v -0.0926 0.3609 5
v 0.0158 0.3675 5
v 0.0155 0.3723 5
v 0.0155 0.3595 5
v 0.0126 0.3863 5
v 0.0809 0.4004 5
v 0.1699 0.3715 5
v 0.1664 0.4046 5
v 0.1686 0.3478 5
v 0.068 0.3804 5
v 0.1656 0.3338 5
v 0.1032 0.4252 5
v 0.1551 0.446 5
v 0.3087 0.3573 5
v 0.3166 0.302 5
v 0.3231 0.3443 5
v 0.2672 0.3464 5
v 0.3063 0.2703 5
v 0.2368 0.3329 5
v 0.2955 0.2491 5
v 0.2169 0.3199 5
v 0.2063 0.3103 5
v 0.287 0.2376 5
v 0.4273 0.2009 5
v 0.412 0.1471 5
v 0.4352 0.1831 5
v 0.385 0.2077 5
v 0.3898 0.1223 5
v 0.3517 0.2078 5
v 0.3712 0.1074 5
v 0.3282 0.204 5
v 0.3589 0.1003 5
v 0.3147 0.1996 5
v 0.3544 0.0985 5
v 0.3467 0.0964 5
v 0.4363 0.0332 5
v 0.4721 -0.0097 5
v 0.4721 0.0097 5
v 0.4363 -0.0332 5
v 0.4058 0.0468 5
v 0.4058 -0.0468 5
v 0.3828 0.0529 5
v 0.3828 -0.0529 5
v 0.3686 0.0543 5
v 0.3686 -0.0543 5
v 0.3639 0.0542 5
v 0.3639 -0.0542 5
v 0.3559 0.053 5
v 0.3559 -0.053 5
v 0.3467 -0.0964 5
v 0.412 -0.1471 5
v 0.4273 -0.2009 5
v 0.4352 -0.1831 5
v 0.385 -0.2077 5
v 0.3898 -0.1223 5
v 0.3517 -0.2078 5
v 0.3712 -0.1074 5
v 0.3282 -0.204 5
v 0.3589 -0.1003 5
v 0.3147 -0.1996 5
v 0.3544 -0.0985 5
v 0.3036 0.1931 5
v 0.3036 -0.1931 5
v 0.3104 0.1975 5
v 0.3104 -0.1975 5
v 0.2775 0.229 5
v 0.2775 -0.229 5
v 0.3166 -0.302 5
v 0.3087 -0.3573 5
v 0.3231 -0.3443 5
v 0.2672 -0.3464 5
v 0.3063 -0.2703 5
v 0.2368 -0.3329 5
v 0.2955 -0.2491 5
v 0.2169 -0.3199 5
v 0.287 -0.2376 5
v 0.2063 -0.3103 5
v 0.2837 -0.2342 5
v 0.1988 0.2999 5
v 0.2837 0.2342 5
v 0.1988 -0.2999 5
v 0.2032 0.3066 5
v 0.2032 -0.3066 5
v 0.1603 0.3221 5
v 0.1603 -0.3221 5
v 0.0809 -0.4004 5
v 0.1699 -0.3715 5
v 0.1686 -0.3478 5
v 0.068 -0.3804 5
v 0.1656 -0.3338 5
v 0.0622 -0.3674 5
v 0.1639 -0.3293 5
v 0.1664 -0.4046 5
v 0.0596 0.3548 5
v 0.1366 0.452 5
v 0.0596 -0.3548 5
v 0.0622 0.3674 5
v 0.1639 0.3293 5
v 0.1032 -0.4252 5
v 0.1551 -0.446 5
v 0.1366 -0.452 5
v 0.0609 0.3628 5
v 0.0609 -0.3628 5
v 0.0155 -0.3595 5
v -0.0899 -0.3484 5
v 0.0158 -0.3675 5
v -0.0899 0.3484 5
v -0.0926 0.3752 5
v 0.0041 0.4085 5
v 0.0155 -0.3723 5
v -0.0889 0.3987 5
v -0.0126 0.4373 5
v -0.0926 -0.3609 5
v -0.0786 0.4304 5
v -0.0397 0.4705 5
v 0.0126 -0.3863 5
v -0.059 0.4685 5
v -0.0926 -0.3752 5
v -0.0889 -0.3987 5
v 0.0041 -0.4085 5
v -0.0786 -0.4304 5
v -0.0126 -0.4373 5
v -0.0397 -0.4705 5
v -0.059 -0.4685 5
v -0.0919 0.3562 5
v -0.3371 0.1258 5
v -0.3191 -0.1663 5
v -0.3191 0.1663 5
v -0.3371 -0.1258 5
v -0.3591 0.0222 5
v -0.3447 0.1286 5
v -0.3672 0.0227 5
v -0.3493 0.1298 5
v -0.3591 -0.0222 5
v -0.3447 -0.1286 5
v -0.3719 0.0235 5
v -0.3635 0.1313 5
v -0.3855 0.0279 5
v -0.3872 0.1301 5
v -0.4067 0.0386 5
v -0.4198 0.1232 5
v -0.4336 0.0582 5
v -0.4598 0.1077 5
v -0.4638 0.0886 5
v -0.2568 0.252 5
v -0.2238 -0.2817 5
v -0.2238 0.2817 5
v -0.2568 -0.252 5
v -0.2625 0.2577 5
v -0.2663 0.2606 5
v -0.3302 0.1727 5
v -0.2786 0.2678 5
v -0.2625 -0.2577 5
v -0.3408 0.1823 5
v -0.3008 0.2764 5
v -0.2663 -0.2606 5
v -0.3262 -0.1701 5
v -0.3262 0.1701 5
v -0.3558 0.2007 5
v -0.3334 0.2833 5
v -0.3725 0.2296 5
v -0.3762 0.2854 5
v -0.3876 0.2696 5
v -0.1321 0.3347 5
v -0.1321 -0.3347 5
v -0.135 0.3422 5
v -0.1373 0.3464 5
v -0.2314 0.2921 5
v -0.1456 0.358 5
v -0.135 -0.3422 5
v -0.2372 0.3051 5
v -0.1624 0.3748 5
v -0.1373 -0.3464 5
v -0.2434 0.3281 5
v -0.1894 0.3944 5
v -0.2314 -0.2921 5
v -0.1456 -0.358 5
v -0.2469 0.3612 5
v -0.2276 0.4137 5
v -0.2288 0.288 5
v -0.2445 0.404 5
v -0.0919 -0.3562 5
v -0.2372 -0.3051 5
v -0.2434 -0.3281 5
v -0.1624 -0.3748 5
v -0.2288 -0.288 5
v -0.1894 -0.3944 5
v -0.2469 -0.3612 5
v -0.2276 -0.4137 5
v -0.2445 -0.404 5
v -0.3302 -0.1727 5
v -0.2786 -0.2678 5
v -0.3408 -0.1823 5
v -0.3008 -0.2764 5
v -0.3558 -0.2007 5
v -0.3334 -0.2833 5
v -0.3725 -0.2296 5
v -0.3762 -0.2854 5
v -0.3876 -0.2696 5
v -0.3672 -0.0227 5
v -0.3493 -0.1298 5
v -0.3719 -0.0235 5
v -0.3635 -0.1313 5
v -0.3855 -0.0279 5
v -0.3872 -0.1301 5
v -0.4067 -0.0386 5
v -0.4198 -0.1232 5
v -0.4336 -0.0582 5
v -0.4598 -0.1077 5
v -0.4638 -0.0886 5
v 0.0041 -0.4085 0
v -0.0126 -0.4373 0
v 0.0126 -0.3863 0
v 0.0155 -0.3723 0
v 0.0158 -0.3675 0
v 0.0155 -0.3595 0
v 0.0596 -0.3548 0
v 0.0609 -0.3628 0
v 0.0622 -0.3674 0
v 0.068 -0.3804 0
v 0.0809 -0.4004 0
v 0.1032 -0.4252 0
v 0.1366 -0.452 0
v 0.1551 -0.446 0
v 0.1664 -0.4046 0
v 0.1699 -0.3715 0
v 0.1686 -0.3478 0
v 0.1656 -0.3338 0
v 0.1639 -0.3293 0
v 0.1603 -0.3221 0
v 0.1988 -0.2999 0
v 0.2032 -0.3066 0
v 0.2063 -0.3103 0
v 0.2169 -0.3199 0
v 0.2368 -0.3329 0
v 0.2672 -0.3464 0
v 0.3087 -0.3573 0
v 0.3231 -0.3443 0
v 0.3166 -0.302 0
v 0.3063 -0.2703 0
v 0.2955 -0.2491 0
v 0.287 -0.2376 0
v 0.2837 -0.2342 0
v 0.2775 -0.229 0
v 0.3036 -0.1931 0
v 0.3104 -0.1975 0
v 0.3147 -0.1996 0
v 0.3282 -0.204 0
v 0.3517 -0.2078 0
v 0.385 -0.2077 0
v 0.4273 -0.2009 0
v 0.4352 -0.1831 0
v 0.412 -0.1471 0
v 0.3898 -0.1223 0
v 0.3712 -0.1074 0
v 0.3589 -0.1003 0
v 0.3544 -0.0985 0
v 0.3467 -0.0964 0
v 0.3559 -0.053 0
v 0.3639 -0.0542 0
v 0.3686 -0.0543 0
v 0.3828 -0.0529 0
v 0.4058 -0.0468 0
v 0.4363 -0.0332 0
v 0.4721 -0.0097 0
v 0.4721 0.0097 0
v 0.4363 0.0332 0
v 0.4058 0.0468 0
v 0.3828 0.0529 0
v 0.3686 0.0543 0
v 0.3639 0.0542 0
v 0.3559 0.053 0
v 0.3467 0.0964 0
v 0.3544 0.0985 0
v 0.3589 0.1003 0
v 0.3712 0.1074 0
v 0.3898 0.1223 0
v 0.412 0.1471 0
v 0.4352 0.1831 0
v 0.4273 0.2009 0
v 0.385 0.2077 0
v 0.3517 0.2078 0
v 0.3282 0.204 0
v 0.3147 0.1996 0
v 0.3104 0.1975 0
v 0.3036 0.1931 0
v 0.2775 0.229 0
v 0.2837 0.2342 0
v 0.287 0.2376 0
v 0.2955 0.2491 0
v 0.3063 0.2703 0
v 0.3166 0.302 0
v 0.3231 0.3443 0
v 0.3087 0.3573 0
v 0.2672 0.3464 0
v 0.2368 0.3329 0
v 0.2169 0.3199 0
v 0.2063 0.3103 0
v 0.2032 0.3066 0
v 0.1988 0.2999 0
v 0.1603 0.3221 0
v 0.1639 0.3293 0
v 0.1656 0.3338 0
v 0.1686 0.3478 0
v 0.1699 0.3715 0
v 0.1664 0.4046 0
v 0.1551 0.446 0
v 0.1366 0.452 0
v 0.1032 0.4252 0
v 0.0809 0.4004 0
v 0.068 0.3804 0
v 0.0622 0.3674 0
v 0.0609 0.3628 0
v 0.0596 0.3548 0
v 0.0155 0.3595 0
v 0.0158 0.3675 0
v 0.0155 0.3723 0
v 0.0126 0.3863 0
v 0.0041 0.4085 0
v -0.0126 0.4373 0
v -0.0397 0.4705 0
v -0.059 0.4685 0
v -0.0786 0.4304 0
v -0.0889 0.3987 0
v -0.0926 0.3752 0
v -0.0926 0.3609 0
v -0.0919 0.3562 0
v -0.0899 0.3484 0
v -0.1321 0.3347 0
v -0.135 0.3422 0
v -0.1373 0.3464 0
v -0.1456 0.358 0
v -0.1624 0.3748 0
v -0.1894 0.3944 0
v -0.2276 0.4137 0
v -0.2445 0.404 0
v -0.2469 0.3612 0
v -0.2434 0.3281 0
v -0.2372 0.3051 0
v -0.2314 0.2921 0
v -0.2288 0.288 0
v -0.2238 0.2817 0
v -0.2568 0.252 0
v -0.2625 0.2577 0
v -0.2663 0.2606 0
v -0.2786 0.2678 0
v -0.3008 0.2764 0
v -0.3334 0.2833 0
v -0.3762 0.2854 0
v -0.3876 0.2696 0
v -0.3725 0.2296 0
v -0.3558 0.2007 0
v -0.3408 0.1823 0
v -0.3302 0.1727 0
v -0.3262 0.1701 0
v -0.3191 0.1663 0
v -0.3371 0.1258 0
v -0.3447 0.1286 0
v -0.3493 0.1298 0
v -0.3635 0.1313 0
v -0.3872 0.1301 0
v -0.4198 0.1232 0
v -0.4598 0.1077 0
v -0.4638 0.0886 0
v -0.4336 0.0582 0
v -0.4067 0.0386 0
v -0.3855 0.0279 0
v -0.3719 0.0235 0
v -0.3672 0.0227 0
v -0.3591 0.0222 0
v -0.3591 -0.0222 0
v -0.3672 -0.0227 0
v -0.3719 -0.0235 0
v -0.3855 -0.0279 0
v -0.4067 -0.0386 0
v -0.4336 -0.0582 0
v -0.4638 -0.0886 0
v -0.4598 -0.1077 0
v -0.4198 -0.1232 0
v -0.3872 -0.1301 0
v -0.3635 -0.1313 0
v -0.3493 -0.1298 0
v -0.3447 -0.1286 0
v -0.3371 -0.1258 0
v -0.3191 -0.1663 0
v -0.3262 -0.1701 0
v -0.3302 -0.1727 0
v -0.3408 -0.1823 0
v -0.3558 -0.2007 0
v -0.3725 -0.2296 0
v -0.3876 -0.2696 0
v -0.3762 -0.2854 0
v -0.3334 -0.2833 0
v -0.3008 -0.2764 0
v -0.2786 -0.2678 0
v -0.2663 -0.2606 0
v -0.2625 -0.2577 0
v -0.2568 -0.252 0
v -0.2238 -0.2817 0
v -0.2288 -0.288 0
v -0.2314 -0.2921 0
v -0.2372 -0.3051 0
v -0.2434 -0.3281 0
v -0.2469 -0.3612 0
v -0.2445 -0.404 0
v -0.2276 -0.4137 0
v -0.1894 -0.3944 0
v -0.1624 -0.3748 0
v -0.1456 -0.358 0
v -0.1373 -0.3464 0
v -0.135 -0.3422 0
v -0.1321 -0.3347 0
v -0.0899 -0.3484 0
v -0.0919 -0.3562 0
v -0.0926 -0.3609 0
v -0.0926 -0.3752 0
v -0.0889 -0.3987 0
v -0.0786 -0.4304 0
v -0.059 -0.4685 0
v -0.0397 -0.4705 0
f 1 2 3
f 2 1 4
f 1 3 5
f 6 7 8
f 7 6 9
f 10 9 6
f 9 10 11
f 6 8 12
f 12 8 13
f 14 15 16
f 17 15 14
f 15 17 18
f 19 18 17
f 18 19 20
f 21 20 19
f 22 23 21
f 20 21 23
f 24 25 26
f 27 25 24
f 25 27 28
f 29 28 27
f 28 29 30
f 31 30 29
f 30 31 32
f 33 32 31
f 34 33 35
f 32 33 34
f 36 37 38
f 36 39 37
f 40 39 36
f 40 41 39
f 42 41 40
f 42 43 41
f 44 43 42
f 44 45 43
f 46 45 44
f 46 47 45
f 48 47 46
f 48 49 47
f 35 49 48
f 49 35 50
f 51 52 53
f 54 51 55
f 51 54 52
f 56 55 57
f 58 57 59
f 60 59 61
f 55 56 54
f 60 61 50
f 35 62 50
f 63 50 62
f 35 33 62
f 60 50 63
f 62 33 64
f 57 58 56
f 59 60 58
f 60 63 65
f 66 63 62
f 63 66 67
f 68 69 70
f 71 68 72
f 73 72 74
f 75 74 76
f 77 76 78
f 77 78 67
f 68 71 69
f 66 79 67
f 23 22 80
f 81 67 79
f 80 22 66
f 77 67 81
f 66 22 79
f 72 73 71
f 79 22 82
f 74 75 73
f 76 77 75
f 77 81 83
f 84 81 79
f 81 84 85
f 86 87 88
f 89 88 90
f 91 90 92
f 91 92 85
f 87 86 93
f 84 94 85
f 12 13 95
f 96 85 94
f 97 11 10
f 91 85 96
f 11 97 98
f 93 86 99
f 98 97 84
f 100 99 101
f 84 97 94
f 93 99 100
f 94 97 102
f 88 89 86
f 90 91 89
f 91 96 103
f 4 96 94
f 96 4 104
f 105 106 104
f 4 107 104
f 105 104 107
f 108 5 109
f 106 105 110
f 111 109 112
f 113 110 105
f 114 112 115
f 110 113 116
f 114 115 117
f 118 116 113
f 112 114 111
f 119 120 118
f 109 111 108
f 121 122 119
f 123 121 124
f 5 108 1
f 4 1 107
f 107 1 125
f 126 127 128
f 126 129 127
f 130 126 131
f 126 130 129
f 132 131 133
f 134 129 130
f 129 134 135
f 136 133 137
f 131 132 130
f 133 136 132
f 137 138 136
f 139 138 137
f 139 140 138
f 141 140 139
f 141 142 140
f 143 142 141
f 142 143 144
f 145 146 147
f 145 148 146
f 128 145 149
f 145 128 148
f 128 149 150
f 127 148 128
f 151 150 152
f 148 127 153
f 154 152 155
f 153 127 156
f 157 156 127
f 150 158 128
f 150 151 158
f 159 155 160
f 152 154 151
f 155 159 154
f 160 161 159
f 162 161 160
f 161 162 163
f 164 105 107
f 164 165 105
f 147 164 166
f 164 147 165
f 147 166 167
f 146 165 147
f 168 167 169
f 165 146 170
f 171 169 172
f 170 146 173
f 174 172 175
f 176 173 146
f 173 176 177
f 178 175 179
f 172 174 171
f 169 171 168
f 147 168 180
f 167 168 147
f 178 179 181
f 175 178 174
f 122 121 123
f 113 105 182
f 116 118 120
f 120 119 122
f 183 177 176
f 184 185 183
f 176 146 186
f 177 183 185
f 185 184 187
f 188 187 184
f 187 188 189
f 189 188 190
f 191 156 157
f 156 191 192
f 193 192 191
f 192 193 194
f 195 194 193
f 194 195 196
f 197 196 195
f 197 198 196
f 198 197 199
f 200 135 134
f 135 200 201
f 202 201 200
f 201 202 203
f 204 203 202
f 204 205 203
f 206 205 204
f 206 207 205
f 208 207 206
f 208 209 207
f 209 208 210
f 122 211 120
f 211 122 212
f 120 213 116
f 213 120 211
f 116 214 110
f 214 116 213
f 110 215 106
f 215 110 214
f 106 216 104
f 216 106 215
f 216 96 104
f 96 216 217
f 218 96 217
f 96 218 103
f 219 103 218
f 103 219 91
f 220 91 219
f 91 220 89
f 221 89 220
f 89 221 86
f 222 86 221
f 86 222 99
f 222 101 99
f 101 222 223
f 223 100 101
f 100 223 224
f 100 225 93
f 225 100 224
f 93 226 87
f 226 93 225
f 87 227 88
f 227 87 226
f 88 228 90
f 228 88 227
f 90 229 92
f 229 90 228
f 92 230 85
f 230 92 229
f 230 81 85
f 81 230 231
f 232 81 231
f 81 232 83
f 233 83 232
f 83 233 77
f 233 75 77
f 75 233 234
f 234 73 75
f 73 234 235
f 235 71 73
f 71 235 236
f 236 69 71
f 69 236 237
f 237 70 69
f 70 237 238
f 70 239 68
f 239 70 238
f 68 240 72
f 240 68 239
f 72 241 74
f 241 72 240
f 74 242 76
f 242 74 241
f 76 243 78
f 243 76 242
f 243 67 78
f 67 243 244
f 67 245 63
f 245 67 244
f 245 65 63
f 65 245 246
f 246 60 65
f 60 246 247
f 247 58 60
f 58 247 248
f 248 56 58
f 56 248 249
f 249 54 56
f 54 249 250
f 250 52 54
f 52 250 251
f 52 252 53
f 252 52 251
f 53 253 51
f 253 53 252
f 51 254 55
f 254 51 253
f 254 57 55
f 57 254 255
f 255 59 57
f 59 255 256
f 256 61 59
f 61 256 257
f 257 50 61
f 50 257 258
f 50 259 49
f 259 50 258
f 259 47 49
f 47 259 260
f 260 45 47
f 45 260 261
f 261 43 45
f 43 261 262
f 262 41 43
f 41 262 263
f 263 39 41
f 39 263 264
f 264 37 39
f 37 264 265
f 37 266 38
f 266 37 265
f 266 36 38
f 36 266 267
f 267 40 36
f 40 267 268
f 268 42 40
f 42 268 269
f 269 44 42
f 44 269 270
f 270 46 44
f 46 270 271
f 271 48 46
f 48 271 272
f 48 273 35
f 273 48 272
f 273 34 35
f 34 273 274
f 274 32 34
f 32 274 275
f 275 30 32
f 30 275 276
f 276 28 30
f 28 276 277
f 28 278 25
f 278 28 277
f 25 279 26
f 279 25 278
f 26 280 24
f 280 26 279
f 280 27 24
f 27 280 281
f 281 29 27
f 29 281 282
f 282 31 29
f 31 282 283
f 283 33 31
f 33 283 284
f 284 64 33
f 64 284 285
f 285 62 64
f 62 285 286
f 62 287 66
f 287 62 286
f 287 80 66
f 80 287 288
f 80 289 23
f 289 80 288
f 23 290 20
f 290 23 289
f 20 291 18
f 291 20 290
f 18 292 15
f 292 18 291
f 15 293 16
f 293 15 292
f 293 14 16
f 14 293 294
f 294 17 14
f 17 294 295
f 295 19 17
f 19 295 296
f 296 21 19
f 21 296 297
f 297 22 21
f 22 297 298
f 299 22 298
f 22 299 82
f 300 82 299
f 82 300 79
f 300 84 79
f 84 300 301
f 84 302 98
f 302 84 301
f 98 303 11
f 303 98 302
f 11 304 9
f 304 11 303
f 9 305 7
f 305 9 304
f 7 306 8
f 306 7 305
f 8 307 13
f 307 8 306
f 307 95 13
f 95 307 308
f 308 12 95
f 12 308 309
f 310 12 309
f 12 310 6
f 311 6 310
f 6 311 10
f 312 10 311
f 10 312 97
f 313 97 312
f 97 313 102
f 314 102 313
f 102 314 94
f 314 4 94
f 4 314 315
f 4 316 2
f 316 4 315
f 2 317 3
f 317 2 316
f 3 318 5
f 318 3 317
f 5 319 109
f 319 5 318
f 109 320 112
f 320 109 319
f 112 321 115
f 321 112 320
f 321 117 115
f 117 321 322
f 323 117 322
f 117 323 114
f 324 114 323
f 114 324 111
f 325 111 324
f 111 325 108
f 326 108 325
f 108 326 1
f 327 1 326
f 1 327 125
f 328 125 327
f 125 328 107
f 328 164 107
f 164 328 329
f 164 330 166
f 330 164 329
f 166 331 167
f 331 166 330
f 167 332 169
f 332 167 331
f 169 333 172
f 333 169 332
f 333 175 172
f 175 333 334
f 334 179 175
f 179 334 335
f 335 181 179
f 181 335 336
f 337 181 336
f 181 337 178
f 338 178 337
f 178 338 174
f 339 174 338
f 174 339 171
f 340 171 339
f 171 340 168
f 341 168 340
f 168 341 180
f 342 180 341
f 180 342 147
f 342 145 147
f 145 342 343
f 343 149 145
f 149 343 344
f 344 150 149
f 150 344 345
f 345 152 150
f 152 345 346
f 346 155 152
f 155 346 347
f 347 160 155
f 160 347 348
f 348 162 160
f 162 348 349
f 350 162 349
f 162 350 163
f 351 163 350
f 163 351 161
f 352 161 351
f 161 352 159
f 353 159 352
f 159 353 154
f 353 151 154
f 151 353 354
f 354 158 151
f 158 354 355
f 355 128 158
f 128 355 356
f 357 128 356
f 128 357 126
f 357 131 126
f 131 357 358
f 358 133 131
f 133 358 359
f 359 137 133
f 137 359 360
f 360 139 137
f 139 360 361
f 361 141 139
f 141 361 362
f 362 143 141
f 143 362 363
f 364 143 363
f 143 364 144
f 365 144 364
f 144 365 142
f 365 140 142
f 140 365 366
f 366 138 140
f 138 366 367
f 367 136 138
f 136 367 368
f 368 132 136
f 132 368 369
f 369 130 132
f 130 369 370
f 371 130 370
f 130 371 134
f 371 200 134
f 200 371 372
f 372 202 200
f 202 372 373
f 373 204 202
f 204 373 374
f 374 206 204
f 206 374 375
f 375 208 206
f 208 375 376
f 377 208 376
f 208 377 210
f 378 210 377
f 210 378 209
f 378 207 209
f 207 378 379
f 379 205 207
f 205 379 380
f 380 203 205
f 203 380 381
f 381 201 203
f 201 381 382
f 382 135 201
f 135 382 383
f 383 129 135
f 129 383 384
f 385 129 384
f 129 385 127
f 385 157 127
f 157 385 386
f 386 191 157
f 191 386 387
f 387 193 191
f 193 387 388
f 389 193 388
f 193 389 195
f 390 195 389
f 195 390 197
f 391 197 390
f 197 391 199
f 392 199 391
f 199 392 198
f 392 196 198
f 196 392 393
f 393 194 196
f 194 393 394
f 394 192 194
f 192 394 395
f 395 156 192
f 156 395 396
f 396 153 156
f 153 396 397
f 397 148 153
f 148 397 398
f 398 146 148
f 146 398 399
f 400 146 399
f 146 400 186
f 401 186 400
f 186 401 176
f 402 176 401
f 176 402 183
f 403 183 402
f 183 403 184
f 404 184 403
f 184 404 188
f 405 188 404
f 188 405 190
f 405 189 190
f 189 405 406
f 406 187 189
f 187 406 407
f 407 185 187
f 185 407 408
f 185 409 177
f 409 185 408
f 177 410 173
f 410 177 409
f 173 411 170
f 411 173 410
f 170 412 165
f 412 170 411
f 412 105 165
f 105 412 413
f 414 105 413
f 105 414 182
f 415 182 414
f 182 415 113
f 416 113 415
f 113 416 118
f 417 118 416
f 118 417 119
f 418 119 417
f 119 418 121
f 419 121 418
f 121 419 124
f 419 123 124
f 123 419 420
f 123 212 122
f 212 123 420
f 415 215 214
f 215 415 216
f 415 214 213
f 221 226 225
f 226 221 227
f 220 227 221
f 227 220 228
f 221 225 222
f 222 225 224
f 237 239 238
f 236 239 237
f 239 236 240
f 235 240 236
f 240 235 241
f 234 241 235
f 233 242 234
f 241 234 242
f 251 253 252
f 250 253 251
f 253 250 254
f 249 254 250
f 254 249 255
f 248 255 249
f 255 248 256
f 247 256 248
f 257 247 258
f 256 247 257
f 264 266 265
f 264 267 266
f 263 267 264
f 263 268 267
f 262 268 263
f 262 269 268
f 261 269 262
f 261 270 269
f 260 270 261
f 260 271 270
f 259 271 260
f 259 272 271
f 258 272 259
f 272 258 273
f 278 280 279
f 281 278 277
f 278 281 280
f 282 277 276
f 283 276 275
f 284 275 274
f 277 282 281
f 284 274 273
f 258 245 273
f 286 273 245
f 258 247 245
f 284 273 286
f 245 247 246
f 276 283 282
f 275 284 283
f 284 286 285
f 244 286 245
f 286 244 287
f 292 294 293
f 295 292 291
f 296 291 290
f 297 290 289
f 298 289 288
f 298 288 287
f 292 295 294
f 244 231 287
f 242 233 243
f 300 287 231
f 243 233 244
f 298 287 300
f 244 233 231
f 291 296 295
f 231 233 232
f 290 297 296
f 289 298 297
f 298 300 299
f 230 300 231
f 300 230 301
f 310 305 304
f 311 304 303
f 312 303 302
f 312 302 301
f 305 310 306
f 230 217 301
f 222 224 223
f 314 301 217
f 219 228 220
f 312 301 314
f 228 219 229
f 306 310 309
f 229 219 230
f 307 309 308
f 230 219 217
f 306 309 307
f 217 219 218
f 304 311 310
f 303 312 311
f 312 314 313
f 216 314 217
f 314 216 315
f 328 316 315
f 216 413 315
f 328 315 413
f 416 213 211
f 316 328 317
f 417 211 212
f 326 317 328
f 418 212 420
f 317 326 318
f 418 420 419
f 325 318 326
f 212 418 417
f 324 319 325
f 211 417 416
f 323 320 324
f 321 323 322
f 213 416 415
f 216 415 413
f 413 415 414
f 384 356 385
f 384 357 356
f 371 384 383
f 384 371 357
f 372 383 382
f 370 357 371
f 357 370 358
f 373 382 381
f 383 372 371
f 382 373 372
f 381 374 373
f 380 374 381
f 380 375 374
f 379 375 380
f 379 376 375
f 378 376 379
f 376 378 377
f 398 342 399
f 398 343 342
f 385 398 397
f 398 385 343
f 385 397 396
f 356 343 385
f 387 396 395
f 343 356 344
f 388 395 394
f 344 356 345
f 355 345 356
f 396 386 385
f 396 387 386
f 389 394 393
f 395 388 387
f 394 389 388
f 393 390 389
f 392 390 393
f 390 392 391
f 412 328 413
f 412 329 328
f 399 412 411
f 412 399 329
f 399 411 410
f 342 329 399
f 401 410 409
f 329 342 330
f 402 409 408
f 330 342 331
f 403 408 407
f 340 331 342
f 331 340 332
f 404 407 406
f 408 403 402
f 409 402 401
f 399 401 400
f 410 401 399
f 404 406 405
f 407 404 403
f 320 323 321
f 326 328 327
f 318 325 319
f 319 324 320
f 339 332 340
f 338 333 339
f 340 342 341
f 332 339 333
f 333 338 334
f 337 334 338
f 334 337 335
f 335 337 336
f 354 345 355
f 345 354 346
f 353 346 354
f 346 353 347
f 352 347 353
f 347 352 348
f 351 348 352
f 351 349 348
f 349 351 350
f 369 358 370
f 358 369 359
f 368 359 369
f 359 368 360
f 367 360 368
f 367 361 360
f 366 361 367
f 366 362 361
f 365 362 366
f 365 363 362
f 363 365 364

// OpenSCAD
// file: machine.scad
/*
 * Helpers for machinging; i.e. kerf alowances
 *
 * Copyright 2013 <b@Zi.iS>
 * License CC BY 3.0
 */

ZCUT = 0;
XOFF = 0;
YOFF = 0;

module drawing() {
	//create blueprint
	if(preview==0) {
		projection(cut=true) translate([
			XOFF,
			YOFF,
			ZCUT
		]) {
            if($children) children([0:$children-1]);
		}
	} else {
        if($children) children([0:$children-1]);
	}
}

module kerf_cube(
	size
) {
	translate([
		kerf/2*(1-preview),
		kerf/2*(1-preview),
		0
	]) {
		cube([
			size[0] - kerf*(1-preview),
			size[1] - kerf*(1-preview),
			size[2]
		]);
	}
}

module kerf_cylinder(
	r,
	h
) {
	cylinder(
		r = r - kerf/2*(1-preview),
		h = h
	);
}

module part(
	id,
	name
) {
	if(PART<1 || PART==id || id<0) {
		if(id>=0) echo(str("PART", id, ":", name));
        if($children) children([0:$children-1]);
	}	
}
// file: easing.scad
/*
 * Make allowances to ensure good fit.
 *
 * Copyright 2013 <b@Zi.iS>
 * License CC BY 3.0
 */

function ease(value) = min(value*1.1, value + .2);
// file: epslion.scad
/*
 * Slightly offset previews to overcome rounding issues
 *
 * Copyright 2013 <b@Zi.iS>
 * License CC BY 3.0
 */

include <config.scad>;

module e(
	shift = -.1,
	size = 1.1
) {
	if(preview == 1) {
		translate([
			0,
			0,
			shift
		]) {
			scale([
				1,
				1,
				size
			]) {
                if($children) children([0:$children-1]);
			}
		}
	} else {
        if($children) children([0:$children-1]);
	}
}

function space(pitch, i) = -pitch/2 + pitch*i;
// file: config.scad
/*
 * Default settings
 *
 * Copyright 2013 <b@Zi.iS>
 * License CC BY 3.0
 */

preview = 1;
$fa = 6;
$fs = 2 - 1.5*(1-preview);
kerf = .3;
PART = 0; //all

// preview colors
color_steel = [.8, .8, .8];
color_wood = [.3, .3, 0];
color_print = [0, .8, 0];
color_plastic = [.7, 1, .7];
color_brass = [181/255, 166/255, 66/255];
color_acrylic = [.9,.9,.9,.5];
// file: main.scad
/*
 * A library to make SCAD easier.
 *
 * Copyright 2013 <b@Zi.iS>
 * License CC BY 3.0
 */

include <config.scad>;
use <epslion.scad>;
use <easing.scad>;
include <machine.scad>;
// main file
/*
 * Herringbone Gear
 *
 * Copyright 2013 b@Zi.iS
 *
 * License CC BY 3.0
 */

include <main.scad>;
use <MCAD/involute_gears.scad>;

herringbone();

module herringbone(
	number_of_teeth = 15,
	circular_pitch = 10,
	pressure_angle = 28,
	clearance = 0,
	helix_angle = 0,
	h = 5,
	h_hub = 5,
){
	if(preview==2) {
		//Too slow for preview
		cylinder(
			r = circular_pitch*number_of_teeth/360,
			h = h
		);
	} else {

		translate([
			0,
			0,
			h/2
		]) {
			gear(
				number_of_teeth = number_of_teeth,
				circular_pitch = circular_pitch,
				pressure_angle = pressure_angle,
				clearance = clearance,
				twist = helix_angle,
				gear_thickness = h/2,
				rim_thickness = h/2,
				hub_thickness = h_hub/2,
				bore_diameter = 0
			);
			mirror([0,0,1]) gear(
				number_of_teeth = number_of_teeth,
				circular_pitch = circular_pitch,
				pressure_angle = pressure_angle,
				clearance = clearance,
				twist = helix_angle,
				gear_thickness = h/2,
				rim_thickness = h/2,
				hub_thickness = h/2,
				bore_diameter = 0
			);
		}
	}
}
